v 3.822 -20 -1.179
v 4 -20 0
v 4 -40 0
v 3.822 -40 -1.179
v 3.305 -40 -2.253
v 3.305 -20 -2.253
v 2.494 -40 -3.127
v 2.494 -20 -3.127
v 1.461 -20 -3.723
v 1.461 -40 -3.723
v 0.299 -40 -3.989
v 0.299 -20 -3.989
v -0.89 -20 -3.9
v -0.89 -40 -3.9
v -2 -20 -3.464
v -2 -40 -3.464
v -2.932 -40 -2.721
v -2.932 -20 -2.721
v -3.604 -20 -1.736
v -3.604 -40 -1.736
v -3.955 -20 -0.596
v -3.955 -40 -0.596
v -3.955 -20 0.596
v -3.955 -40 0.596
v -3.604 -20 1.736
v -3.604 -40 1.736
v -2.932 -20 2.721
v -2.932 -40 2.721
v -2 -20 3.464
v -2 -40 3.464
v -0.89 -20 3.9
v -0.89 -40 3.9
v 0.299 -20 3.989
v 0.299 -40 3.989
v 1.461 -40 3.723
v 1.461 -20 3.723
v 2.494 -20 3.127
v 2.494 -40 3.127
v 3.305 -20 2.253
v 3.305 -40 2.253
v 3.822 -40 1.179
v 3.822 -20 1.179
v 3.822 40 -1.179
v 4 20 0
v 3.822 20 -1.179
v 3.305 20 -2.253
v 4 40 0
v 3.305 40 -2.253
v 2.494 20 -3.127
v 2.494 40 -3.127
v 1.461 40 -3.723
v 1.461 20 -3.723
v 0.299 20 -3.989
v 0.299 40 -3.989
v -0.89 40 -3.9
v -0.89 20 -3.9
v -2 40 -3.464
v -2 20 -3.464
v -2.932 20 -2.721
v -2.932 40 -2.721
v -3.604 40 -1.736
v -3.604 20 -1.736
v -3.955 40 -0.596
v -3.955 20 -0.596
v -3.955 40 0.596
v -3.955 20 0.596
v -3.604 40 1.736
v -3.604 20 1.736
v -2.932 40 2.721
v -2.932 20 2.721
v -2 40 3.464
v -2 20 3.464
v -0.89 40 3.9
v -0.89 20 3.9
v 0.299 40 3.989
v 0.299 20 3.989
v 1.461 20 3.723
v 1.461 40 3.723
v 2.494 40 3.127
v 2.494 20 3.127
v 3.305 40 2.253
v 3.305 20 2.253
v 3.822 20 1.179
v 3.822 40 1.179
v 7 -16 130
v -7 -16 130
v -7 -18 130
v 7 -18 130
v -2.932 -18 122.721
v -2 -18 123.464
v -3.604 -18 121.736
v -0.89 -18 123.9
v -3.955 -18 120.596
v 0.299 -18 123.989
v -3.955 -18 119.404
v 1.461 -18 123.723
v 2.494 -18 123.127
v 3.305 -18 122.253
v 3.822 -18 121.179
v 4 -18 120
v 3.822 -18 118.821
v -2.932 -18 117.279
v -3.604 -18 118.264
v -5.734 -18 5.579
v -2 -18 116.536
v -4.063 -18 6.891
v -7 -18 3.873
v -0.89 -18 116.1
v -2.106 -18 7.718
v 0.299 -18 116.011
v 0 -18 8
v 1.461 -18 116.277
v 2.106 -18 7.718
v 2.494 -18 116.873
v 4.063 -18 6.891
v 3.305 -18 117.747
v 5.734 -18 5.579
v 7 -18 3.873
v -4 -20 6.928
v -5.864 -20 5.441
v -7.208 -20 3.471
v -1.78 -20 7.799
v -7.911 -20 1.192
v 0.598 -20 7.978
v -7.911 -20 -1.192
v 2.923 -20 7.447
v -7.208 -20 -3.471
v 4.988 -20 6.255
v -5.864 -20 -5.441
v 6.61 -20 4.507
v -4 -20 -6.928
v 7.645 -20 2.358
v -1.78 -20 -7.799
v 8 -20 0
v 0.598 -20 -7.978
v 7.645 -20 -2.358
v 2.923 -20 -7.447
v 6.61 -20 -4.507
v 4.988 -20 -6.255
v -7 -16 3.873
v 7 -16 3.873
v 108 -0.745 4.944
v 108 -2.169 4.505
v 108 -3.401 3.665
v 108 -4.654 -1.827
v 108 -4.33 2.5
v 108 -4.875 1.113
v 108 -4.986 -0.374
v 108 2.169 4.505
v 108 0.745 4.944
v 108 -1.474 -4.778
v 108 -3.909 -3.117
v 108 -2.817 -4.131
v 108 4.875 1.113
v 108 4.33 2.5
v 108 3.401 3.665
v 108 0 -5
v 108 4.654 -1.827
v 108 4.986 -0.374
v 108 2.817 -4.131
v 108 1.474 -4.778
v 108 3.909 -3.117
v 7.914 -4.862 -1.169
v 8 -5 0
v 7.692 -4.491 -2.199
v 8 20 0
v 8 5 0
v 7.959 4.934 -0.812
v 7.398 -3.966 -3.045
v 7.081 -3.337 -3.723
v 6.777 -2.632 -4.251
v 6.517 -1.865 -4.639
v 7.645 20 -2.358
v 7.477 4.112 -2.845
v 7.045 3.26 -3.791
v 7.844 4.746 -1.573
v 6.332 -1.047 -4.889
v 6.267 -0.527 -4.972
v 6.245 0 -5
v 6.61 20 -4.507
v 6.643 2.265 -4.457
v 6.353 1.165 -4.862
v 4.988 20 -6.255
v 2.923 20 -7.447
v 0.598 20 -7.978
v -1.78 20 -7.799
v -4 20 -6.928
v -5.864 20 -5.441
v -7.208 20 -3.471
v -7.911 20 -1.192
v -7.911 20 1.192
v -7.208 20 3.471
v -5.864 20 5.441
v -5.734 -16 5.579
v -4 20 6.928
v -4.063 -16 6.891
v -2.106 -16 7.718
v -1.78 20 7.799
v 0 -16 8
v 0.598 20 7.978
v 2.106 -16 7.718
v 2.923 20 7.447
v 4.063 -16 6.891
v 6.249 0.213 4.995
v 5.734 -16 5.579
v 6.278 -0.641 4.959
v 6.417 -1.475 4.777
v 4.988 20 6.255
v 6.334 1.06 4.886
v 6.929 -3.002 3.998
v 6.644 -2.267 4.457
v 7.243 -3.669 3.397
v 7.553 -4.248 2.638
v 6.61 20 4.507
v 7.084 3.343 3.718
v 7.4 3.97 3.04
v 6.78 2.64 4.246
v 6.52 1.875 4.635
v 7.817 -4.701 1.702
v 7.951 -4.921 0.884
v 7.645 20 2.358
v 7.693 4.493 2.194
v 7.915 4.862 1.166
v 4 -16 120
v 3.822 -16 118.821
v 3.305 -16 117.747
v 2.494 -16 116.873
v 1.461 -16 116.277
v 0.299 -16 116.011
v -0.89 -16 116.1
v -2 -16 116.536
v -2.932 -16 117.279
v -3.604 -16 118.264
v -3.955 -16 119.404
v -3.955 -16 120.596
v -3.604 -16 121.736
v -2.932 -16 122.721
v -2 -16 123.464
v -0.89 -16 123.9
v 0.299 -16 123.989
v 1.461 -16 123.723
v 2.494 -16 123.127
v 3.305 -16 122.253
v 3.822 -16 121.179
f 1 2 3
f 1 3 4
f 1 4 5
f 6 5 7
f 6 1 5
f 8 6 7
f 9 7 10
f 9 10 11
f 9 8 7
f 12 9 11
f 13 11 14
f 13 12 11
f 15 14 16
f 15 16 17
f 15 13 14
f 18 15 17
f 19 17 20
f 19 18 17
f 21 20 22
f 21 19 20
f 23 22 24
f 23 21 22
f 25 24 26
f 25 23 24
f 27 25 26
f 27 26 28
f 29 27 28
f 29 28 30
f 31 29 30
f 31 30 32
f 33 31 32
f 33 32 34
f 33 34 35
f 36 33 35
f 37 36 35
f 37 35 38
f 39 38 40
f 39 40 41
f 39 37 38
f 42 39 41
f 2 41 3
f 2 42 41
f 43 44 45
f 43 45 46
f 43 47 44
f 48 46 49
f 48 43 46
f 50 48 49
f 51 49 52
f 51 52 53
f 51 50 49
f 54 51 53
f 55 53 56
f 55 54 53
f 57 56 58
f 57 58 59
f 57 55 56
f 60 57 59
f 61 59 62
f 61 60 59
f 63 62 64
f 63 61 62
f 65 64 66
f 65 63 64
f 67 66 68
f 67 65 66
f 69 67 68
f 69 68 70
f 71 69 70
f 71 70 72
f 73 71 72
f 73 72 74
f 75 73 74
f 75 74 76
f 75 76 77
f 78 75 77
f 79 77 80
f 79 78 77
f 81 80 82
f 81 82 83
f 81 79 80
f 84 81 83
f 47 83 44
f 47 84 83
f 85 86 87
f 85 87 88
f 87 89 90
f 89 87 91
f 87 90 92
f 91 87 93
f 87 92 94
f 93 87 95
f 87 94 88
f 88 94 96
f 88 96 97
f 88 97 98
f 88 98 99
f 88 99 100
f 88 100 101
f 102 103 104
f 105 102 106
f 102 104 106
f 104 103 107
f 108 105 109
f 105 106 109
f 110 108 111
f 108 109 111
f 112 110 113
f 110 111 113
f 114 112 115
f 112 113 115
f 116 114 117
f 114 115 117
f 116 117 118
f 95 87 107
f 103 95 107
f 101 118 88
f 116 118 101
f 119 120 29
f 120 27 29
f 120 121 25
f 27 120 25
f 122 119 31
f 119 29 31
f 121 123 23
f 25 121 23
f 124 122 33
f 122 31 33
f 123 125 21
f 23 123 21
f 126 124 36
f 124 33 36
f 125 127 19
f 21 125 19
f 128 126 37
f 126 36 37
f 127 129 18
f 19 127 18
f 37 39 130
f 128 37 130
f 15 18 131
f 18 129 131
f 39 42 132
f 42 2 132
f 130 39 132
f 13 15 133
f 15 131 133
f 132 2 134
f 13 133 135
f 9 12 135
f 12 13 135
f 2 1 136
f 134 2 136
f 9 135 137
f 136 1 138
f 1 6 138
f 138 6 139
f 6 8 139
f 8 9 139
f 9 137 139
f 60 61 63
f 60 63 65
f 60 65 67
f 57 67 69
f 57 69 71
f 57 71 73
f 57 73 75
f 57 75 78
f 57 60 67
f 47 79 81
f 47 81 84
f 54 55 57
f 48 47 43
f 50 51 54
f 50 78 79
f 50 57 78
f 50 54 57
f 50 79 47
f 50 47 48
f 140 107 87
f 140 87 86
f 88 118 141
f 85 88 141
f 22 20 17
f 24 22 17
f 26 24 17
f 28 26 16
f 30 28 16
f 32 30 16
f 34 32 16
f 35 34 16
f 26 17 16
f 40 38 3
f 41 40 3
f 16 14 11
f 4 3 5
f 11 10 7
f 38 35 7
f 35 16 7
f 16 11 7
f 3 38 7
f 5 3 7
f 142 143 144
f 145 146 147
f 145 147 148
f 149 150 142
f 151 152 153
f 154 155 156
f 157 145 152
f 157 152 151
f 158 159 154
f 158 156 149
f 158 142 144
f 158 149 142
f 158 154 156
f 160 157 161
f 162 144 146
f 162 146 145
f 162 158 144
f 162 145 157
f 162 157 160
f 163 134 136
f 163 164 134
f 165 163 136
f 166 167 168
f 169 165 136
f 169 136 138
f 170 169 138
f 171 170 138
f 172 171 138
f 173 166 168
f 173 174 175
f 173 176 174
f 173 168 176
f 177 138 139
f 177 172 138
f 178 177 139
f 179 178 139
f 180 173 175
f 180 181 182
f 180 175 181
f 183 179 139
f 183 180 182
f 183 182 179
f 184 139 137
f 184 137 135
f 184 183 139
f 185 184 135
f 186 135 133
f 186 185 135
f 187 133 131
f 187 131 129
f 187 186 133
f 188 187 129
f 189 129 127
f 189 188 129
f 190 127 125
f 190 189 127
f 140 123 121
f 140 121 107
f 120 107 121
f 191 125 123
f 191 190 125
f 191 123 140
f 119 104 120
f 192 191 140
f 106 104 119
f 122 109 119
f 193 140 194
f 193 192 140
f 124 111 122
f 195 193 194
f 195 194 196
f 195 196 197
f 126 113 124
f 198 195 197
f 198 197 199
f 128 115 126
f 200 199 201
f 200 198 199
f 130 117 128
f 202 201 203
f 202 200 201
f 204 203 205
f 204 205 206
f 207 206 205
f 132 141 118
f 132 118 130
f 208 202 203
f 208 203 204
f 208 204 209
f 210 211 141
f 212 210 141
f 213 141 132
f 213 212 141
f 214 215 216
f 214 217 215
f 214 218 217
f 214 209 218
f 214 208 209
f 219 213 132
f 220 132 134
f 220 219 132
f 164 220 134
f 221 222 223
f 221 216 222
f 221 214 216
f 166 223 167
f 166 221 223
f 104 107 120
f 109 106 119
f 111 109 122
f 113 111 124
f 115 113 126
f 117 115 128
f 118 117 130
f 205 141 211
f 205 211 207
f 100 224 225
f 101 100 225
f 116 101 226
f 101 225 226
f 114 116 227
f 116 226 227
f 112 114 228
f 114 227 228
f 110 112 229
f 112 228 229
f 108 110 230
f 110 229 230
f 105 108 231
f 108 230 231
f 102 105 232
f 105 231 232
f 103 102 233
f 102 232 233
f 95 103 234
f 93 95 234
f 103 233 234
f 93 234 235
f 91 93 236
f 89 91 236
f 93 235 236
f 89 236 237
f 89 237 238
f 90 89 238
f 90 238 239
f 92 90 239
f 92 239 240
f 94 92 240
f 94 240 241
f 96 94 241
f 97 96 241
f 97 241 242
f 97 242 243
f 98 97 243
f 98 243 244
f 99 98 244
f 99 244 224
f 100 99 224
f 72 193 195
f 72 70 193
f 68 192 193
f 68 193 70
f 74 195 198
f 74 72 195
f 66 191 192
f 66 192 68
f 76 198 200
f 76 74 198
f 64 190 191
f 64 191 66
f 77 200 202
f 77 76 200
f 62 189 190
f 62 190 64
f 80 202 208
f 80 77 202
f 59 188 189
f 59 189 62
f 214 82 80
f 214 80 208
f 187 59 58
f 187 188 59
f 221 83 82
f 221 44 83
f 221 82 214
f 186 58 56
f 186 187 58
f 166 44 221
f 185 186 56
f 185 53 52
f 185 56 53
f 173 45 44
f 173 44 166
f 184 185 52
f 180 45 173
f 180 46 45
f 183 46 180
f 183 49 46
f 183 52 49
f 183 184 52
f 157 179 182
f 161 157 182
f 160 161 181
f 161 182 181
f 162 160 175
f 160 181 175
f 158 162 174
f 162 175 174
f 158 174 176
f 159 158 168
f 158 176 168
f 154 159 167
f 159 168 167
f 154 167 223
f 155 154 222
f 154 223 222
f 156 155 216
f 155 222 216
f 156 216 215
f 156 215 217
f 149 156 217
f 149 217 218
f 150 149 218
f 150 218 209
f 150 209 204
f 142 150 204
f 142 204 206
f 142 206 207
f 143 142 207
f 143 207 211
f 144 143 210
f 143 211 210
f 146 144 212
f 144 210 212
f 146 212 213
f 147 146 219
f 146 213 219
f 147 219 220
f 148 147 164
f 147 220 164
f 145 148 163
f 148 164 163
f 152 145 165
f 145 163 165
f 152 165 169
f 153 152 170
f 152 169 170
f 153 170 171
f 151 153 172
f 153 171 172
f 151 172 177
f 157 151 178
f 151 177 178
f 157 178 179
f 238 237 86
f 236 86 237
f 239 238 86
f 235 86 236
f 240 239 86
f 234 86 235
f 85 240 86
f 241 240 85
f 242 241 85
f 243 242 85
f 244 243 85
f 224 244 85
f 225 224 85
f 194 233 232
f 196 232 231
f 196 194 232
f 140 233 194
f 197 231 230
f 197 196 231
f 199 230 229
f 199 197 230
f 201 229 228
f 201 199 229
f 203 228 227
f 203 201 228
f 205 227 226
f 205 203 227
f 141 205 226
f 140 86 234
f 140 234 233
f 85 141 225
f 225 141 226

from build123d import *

# Parameters (mm, degrees)
SKETCH1_R           = 4
BOSS_EXTRUDE1_DEPTH = 40
SKETCH3_R           = 8
BOSS_EXTRUDE2_DEPTH = 20
SKETCH4_R           = 5
BOSS_EXTRUDE3_DEPTH = 108
SKETCH5_W           = 14
SKETCH5_H           = 2
BOSS_EXTRUDE4_DEPTH = 130
CUT_EXTRUDE1_REACH  = 26
SKETCH6_R           = 4


with BuildPart() as part:
    # Sketch1 → Boss-Extrude1 (new body, symmetric)
    with BuildSketch(Plane(origin=(0, 0, 0), x_dir=(1, 0, 0), z_dir=(0, 1, 0))):
        Circle(SKETCH1_R)
    extrude(amount=BOSS_EXTRUDE1_DEPTH, both=True)

    # Sketch3 → Boss-Extrude2 (add, symmetric)
    with BuildSketch(Plane(origin=(0, 0, 0), x_dir=(1, 0, 0), z_dir=(0, 1, 0))):
        Circle(SKETCH3_R)
    extrude(amount=BOSS_EXTRUDE2_DEPTH, both=True)

    # Sketch4 → Boss-Extrude3 (add)
    with BuildSketch(Plane(origin=(0, 0, 0), x_dir=(0, 0, -1), z_dir=(1, 0, 0))):
        Circle(SKETCH4_R)
    extrude(amount=BOSS_EXTRUDE3_DEPTH)

    # Sketch5 → Boss-Extrude4 (add)
    with BuildSketch(Plane.XY):
        with Locations((0, -17)):
            Rectangle(SKETCH5_W, SKETCH5_H)
    extrude(amount=BOSS_EXTRUDE4_DEPTH)

    # Sketch6 → Cut-Extrude1 (cut, up to next)
    with BuildSketch(Plane(origin=(0, -16, 0), x_dir=(1, 0, 0), z_dir=(0, 1, 0)), mode=Mode.PRIVATE) as cut_extrude1_sk1:
        with Locations((0, -120)):
            Circle(SKETCH6_R)
    cut_extrude1_tool1 = extrude(cut_extrude1_sk1.sketch, amount=-CUT_EXTRUDE1_REACH, mode=Mode.PRIVATE) & part.part
    add(cut_extrude1_tool1.solids().sort_by_distance((0, -16, 120))[0], mode=Mode.SUBTRACT)


solid = part.part
